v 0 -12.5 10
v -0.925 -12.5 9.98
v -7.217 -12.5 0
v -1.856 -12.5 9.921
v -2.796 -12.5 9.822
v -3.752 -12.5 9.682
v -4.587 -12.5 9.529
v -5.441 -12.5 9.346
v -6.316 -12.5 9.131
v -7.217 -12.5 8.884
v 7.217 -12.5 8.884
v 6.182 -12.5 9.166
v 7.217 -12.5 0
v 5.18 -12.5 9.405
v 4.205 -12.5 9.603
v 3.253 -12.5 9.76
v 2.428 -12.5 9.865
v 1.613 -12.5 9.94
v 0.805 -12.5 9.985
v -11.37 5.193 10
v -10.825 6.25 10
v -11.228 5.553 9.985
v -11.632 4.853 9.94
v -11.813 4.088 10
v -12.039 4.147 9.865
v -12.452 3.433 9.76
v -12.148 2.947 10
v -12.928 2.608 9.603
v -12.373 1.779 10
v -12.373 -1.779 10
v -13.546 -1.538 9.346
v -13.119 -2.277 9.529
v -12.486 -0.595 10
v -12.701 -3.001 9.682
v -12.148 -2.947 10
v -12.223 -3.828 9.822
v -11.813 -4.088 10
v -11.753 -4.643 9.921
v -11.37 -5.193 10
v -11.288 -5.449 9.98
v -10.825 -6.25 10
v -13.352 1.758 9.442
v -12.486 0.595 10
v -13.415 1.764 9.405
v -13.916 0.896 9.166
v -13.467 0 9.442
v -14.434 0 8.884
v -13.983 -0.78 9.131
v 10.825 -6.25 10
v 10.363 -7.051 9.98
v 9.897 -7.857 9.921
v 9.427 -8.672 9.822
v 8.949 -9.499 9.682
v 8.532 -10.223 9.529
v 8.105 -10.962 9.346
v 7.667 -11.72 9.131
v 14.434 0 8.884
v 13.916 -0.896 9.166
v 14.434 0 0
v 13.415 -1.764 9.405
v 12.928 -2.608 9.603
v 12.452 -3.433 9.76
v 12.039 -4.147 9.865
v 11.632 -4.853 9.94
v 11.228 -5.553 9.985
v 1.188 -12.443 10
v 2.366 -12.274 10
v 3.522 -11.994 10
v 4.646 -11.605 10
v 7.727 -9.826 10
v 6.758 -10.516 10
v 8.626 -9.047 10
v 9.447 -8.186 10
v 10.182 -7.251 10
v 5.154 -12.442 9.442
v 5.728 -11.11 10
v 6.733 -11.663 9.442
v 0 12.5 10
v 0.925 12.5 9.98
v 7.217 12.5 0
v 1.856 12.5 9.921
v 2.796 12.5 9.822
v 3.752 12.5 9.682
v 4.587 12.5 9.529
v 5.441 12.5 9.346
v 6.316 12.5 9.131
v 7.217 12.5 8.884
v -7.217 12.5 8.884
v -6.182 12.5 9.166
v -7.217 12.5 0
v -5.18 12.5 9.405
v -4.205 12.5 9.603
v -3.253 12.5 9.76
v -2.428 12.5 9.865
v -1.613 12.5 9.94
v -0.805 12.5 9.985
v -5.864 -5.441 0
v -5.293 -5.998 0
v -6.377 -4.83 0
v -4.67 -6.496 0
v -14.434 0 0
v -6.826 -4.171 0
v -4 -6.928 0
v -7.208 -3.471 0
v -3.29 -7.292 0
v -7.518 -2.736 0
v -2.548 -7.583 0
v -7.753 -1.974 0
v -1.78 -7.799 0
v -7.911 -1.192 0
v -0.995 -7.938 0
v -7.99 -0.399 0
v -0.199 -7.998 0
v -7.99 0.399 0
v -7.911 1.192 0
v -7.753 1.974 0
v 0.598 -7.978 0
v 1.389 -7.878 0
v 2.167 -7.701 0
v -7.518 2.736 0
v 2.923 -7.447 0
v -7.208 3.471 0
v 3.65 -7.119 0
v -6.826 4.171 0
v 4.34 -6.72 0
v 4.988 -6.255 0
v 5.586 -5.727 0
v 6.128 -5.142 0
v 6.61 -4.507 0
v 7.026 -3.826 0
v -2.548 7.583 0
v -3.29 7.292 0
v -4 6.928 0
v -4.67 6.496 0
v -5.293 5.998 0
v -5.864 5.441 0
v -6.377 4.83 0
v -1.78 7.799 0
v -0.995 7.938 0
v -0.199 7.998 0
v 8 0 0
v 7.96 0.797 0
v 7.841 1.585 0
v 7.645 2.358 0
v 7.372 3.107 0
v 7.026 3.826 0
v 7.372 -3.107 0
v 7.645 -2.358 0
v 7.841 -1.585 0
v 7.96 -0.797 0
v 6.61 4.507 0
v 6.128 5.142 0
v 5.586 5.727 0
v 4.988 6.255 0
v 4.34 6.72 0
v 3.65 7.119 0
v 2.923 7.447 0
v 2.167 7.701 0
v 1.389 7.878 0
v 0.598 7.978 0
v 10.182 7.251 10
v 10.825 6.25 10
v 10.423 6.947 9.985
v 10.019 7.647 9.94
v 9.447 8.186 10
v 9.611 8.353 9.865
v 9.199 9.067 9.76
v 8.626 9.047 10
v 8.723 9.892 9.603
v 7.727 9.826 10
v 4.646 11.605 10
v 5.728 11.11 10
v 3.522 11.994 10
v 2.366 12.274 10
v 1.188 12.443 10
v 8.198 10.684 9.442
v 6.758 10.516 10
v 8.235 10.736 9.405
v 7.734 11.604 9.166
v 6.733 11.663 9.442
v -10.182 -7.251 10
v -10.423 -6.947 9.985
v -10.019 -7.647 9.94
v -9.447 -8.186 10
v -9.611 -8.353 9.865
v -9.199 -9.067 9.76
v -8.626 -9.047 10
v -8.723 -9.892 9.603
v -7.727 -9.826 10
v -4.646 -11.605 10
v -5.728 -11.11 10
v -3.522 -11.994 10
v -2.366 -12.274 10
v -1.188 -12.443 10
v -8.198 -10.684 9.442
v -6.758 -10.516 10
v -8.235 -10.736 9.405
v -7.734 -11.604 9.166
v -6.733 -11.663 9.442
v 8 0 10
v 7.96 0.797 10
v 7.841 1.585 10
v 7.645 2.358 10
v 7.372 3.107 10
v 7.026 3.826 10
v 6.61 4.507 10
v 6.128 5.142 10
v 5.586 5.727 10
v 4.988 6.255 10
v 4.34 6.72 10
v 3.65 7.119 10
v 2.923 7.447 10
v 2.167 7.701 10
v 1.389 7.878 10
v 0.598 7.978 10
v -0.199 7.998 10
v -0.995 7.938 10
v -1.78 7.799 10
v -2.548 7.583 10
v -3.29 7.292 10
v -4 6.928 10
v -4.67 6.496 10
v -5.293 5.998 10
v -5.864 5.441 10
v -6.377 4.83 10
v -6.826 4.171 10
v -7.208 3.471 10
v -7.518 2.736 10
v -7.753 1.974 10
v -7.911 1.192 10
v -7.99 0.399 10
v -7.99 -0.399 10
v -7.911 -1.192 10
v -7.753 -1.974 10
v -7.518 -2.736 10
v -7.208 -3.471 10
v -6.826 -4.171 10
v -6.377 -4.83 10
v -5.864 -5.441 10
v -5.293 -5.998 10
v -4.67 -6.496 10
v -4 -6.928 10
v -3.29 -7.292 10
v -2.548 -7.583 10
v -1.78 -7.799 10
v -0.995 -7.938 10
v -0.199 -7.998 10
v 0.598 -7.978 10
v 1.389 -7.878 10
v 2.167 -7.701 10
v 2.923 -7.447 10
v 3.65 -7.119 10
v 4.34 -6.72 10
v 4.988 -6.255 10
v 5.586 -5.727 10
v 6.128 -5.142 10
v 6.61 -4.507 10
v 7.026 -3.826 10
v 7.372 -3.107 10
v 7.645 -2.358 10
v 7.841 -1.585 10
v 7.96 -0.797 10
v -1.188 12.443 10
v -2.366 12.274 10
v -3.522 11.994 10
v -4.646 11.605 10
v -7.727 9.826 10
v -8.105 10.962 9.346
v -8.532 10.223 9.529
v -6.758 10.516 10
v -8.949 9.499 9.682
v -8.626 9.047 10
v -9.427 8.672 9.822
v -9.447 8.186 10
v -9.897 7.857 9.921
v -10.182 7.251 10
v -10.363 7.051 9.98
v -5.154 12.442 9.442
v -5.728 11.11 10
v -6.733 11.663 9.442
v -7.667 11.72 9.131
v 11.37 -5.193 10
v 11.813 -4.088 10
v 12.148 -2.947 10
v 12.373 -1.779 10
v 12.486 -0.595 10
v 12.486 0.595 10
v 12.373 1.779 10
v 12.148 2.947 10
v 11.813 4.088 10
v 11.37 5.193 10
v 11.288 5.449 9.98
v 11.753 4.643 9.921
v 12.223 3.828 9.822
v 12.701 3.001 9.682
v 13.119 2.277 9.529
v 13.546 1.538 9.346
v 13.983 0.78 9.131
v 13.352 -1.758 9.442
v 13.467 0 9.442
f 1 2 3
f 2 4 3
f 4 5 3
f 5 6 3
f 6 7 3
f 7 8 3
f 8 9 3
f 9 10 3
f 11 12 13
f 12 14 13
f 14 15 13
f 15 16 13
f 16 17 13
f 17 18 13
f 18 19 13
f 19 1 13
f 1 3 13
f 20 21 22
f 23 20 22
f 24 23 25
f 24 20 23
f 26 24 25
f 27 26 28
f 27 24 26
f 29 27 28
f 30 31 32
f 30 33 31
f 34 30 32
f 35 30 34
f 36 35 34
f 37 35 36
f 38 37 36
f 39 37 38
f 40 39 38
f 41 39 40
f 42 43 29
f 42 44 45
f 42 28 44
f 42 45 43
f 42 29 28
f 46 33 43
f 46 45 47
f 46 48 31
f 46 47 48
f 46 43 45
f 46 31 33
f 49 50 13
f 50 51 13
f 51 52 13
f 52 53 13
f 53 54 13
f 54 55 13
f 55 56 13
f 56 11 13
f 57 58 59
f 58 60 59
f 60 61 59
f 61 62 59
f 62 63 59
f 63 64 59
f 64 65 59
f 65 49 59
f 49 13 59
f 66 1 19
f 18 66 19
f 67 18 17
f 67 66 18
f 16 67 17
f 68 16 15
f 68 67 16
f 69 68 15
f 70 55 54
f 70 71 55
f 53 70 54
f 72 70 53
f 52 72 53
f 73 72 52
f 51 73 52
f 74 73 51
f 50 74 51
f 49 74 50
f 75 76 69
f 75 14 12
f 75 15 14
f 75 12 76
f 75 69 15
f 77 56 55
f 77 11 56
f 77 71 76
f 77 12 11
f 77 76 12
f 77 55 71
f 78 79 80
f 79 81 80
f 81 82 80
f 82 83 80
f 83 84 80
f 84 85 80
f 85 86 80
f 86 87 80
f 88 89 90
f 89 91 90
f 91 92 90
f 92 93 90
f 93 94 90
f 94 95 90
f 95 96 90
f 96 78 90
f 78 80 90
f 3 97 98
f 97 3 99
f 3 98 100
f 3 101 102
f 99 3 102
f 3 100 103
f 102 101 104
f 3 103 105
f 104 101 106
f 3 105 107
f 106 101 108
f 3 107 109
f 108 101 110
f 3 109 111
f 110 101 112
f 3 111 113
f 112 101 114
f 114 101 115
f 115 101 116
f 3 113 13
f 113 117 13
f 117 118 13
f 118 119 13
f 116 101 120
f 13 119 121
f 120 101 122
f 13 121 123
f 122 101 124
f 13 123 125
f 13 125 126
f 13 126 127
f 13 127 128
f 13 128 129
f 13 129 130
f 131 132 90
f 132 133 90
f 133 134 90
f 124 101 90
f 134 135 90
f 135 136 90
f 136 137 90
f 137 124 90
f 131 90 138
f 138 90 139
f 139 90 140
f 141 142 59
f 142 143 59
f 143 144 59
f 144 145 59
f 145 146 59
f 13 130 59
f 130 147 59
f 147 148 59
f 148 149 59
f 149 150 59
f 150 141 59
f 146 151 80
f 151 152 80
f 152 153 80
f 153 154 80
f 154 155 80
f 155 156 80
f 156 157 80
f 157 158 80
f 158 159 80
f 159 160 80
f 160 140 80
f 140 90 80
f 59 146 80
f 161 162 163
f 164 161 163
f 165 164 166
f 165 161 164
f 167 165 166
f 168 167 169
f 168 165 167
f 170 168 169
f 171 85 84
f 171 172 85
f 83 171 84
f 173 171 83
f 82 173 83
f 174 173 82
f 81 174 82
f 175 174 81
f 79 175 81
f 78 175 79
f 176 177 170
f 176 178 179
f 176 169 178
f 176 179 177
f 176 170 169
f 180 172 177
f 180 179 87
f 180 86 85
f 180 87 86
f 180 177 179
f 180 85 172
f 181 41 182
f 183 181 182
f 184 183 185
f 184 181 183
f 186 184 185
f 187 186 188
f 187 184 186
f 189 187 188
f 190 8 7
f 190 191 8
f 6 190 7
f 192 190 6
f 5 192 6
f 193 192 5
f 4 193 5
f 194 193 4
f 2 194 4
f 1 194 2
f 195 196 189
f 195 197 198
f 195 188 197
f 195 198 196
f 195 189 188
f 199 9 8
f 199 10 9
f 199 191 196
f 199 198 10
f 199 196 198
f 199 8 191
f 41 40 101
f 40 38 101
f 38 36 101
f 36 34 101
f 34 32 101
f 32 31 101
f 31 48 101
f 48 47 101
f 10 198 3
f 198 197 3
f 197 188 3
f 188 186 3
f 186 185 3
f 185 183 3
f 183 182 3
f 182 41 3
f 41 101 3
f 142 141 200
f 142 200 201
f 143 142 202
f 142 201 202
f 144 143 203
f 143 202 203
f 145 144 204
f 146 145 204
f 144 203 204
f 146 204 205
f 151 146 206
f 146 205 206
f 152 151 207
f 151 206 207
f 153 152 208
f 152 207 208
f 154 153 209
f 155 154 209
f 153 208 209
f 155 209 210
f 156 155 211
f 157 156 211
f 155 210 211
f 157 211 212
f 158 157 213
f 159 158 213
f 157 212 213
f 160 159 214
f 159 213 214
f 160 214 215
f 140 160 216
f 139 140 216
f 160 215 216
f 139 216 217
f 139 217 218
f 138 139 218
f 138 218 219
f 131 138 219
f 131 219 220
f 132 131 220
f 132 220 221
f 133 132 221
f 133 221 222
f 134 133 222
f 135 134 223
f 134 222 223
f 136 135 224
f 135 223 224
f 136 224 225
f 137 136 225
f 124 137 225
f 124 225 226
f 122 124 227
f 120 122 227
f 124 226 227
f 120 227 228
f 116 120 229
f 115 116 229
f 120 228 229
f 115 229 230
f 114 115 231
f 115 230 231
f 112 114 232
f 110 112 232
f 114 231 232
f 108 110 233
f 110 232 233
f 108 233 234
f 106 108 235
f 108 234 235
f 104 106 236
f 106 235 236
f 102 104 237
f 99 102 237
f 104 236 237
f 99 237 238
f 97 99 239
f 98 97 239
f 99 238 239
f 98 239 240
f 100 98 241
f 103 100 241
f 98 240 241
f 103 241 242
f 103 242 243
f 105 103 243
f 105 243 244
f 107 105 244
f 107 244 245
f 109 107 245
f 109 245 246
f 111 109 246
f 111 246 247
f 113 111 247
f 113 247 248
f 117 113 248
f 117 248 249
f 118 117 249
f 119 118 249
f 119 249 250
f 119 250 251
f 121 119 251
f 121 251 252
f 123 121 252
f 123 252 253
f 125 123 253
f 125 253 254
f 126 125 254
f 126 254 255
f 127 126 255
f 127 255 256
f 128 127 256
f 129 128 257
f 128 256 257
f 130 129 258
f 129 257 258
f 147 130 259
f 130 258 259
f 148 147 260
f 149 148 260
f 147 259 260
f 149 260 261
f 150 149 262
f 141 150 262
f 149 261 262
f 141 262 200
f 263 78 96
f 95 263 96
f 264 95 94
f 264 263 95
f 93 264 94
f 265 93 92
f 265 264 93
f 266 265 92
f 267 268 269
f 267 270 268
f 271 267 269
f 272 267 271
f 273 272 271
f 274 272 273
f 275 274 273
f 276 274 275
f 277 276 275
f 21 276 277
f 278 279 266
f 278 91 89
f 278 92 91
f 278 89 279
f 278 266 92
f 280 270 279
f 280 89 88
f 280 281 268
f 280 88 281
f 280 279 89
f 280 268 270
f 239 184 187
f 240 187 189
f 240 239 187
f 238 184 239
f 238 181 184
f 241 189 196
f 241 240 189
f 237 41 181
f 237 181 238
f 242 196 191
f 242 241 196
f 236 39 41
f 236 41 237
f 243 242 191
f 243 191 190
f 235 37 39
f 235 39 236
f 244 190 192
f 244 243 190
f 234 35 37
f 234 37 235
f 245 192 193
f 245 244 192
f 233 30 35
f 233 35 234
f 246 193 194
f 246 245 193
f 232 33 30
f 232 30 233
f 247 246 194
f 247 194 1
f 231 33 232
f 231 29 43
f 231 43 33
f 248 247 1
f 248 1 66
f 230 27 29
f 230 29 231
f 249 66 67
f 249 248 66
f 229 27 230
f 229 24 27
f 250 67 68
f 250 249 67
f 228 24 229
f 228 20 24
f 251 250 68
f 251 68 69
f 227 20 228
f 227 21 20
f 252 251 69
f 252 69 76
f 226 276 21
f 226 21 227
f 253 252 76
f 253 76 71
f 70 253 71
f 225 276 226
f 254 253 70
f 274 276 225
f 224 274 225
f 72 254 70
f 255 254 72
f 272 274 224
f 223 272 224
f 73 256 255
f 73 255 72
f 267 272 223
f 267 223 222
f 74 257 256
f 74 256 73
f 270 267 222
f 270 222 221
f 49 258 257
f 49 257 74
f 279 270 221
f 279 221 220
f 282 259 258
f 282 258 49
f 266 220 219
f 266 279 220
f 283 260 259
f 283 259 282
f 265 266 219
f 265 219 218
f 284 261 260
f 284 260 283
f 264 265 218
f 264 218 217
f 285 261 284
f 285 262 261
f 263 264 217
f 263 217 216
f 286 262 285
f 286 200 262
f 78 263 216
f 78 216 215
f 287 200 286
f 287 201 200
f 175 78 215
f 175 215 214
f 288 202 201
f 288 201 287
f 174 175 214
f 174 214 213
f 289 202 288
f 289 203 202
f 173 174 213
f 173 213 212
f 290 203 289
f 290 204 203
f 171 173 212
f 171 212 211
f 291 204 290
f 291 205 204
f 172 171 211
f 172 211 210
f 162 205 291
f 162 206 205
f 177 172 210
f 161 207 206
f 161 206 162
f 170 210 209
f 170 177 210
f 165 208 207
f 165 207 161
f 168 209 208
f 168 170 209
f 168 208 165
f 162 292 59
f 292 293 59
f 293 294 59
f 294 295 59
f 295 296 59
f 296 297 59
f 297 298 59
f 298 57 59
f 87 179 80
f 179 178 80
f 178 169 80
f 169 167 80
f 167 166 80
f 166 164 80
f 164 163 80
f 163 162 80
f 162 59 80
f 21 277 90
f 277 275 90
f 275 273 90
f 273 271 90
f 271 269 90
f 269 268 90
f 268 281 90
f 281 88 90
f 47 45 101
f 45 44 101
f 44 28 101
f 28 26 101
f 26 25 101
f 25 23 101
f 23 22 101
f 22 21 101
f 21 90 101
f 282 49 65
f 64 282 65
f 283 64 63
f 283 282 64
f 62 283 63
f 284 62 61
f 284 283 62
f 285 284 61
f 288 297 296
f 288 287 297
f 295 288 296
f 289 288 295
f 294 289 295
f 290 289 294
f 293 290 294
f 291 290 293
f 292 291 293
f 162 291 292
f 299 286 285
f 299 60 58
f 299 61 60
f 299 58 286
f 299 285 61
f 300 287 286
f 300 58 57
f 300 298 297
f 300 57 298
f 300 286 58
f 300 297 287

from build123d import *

# Parameters (mm, degrees)
Y_KSEKLIK_EKSTR_ZYON1_DEPTH = 10
IZIM2_R                     = 8
KES_EKSTR_ZYON1_DEPTH       = 10
IZIM3_OUTSIDE_W             = 73.404
IZIM3_OUTSIDE_H             = 69.536
IZIM3_OUTSIDE_R             = 12.5
KES_EKSTR_ZYON2_DEPTH       = 10
KES_EKSTR_ZYON2_DRAFT       = -60


with BuildPart() as part:
    # Çizim1 → Yükseklik-Ekstrüzyon1 (new body)
    with BuildSketch(Plane.XY):
        Polygon((14.43375673, 0), (7.216878365, 12.5), (-7.216878365, 12.5), (-14.43375673, 0), (-7.216878365, -12.5), (7.216878365, -12.5), align=None)
    extrude(amount=Y_KSEKLIK_EKSTR_ZYON1_DEPTH)

    # Çizim2 → Kes-Ekstrüzyon1 (cut)
    with BuildSketch(Plane.XY.offset(10)):
        Circle(IZIM2_R)
    extrude(amount=-KES_EKSTR_ZYON1_DEPTH, mode=Mode.SUBTRACT)


with BuildPart() as kes_ekstr_zyon2_tool:
    # Çizim3 outside → Kes-Ekstrüzyon2 (with draft: the straight prism first)
    with BuildSketch(Plane.XY.offset(10)):
        Rectangle(IZIM3_OUTSIDE_W, IZIM3_OUTSIDE_H)
        Circle(IZIM3_OUTSIDE_R, mode=Mode.SUBTRACT)
    extrude(amount=-KES_EKSTR_ZYON2_DEPTH)
    # Kes-Ekstrüzyon2: the draft: its side faces are tilted about the plane it starts from
    kes_ekstr_zyon2_sides = [kes_ekstr_zyon2_tool.faces().sort_by_distance(p)[0] for p in [
        (0, -34.768, 5),
        (36.702, 0, 5),
        (0, 34.768, 5),
        (-36.702, 0, 5),
        (-12.5, 0, 5),
    ]]
    draft(kes_ekstr_zyon2_sides, Plane.XY.offset(10), KES_EKSTR_ZYON2_DRAFT)


with BuildPart() as part_1:
    add(part.part)

    # Kes-Ekstrüzyon2: cut by kes_ekstr_zyon2_tool
    add(kes_ekstr_zyon2_tool.part, mode=Mode.SUBTRACT)


solid = part_1.part
